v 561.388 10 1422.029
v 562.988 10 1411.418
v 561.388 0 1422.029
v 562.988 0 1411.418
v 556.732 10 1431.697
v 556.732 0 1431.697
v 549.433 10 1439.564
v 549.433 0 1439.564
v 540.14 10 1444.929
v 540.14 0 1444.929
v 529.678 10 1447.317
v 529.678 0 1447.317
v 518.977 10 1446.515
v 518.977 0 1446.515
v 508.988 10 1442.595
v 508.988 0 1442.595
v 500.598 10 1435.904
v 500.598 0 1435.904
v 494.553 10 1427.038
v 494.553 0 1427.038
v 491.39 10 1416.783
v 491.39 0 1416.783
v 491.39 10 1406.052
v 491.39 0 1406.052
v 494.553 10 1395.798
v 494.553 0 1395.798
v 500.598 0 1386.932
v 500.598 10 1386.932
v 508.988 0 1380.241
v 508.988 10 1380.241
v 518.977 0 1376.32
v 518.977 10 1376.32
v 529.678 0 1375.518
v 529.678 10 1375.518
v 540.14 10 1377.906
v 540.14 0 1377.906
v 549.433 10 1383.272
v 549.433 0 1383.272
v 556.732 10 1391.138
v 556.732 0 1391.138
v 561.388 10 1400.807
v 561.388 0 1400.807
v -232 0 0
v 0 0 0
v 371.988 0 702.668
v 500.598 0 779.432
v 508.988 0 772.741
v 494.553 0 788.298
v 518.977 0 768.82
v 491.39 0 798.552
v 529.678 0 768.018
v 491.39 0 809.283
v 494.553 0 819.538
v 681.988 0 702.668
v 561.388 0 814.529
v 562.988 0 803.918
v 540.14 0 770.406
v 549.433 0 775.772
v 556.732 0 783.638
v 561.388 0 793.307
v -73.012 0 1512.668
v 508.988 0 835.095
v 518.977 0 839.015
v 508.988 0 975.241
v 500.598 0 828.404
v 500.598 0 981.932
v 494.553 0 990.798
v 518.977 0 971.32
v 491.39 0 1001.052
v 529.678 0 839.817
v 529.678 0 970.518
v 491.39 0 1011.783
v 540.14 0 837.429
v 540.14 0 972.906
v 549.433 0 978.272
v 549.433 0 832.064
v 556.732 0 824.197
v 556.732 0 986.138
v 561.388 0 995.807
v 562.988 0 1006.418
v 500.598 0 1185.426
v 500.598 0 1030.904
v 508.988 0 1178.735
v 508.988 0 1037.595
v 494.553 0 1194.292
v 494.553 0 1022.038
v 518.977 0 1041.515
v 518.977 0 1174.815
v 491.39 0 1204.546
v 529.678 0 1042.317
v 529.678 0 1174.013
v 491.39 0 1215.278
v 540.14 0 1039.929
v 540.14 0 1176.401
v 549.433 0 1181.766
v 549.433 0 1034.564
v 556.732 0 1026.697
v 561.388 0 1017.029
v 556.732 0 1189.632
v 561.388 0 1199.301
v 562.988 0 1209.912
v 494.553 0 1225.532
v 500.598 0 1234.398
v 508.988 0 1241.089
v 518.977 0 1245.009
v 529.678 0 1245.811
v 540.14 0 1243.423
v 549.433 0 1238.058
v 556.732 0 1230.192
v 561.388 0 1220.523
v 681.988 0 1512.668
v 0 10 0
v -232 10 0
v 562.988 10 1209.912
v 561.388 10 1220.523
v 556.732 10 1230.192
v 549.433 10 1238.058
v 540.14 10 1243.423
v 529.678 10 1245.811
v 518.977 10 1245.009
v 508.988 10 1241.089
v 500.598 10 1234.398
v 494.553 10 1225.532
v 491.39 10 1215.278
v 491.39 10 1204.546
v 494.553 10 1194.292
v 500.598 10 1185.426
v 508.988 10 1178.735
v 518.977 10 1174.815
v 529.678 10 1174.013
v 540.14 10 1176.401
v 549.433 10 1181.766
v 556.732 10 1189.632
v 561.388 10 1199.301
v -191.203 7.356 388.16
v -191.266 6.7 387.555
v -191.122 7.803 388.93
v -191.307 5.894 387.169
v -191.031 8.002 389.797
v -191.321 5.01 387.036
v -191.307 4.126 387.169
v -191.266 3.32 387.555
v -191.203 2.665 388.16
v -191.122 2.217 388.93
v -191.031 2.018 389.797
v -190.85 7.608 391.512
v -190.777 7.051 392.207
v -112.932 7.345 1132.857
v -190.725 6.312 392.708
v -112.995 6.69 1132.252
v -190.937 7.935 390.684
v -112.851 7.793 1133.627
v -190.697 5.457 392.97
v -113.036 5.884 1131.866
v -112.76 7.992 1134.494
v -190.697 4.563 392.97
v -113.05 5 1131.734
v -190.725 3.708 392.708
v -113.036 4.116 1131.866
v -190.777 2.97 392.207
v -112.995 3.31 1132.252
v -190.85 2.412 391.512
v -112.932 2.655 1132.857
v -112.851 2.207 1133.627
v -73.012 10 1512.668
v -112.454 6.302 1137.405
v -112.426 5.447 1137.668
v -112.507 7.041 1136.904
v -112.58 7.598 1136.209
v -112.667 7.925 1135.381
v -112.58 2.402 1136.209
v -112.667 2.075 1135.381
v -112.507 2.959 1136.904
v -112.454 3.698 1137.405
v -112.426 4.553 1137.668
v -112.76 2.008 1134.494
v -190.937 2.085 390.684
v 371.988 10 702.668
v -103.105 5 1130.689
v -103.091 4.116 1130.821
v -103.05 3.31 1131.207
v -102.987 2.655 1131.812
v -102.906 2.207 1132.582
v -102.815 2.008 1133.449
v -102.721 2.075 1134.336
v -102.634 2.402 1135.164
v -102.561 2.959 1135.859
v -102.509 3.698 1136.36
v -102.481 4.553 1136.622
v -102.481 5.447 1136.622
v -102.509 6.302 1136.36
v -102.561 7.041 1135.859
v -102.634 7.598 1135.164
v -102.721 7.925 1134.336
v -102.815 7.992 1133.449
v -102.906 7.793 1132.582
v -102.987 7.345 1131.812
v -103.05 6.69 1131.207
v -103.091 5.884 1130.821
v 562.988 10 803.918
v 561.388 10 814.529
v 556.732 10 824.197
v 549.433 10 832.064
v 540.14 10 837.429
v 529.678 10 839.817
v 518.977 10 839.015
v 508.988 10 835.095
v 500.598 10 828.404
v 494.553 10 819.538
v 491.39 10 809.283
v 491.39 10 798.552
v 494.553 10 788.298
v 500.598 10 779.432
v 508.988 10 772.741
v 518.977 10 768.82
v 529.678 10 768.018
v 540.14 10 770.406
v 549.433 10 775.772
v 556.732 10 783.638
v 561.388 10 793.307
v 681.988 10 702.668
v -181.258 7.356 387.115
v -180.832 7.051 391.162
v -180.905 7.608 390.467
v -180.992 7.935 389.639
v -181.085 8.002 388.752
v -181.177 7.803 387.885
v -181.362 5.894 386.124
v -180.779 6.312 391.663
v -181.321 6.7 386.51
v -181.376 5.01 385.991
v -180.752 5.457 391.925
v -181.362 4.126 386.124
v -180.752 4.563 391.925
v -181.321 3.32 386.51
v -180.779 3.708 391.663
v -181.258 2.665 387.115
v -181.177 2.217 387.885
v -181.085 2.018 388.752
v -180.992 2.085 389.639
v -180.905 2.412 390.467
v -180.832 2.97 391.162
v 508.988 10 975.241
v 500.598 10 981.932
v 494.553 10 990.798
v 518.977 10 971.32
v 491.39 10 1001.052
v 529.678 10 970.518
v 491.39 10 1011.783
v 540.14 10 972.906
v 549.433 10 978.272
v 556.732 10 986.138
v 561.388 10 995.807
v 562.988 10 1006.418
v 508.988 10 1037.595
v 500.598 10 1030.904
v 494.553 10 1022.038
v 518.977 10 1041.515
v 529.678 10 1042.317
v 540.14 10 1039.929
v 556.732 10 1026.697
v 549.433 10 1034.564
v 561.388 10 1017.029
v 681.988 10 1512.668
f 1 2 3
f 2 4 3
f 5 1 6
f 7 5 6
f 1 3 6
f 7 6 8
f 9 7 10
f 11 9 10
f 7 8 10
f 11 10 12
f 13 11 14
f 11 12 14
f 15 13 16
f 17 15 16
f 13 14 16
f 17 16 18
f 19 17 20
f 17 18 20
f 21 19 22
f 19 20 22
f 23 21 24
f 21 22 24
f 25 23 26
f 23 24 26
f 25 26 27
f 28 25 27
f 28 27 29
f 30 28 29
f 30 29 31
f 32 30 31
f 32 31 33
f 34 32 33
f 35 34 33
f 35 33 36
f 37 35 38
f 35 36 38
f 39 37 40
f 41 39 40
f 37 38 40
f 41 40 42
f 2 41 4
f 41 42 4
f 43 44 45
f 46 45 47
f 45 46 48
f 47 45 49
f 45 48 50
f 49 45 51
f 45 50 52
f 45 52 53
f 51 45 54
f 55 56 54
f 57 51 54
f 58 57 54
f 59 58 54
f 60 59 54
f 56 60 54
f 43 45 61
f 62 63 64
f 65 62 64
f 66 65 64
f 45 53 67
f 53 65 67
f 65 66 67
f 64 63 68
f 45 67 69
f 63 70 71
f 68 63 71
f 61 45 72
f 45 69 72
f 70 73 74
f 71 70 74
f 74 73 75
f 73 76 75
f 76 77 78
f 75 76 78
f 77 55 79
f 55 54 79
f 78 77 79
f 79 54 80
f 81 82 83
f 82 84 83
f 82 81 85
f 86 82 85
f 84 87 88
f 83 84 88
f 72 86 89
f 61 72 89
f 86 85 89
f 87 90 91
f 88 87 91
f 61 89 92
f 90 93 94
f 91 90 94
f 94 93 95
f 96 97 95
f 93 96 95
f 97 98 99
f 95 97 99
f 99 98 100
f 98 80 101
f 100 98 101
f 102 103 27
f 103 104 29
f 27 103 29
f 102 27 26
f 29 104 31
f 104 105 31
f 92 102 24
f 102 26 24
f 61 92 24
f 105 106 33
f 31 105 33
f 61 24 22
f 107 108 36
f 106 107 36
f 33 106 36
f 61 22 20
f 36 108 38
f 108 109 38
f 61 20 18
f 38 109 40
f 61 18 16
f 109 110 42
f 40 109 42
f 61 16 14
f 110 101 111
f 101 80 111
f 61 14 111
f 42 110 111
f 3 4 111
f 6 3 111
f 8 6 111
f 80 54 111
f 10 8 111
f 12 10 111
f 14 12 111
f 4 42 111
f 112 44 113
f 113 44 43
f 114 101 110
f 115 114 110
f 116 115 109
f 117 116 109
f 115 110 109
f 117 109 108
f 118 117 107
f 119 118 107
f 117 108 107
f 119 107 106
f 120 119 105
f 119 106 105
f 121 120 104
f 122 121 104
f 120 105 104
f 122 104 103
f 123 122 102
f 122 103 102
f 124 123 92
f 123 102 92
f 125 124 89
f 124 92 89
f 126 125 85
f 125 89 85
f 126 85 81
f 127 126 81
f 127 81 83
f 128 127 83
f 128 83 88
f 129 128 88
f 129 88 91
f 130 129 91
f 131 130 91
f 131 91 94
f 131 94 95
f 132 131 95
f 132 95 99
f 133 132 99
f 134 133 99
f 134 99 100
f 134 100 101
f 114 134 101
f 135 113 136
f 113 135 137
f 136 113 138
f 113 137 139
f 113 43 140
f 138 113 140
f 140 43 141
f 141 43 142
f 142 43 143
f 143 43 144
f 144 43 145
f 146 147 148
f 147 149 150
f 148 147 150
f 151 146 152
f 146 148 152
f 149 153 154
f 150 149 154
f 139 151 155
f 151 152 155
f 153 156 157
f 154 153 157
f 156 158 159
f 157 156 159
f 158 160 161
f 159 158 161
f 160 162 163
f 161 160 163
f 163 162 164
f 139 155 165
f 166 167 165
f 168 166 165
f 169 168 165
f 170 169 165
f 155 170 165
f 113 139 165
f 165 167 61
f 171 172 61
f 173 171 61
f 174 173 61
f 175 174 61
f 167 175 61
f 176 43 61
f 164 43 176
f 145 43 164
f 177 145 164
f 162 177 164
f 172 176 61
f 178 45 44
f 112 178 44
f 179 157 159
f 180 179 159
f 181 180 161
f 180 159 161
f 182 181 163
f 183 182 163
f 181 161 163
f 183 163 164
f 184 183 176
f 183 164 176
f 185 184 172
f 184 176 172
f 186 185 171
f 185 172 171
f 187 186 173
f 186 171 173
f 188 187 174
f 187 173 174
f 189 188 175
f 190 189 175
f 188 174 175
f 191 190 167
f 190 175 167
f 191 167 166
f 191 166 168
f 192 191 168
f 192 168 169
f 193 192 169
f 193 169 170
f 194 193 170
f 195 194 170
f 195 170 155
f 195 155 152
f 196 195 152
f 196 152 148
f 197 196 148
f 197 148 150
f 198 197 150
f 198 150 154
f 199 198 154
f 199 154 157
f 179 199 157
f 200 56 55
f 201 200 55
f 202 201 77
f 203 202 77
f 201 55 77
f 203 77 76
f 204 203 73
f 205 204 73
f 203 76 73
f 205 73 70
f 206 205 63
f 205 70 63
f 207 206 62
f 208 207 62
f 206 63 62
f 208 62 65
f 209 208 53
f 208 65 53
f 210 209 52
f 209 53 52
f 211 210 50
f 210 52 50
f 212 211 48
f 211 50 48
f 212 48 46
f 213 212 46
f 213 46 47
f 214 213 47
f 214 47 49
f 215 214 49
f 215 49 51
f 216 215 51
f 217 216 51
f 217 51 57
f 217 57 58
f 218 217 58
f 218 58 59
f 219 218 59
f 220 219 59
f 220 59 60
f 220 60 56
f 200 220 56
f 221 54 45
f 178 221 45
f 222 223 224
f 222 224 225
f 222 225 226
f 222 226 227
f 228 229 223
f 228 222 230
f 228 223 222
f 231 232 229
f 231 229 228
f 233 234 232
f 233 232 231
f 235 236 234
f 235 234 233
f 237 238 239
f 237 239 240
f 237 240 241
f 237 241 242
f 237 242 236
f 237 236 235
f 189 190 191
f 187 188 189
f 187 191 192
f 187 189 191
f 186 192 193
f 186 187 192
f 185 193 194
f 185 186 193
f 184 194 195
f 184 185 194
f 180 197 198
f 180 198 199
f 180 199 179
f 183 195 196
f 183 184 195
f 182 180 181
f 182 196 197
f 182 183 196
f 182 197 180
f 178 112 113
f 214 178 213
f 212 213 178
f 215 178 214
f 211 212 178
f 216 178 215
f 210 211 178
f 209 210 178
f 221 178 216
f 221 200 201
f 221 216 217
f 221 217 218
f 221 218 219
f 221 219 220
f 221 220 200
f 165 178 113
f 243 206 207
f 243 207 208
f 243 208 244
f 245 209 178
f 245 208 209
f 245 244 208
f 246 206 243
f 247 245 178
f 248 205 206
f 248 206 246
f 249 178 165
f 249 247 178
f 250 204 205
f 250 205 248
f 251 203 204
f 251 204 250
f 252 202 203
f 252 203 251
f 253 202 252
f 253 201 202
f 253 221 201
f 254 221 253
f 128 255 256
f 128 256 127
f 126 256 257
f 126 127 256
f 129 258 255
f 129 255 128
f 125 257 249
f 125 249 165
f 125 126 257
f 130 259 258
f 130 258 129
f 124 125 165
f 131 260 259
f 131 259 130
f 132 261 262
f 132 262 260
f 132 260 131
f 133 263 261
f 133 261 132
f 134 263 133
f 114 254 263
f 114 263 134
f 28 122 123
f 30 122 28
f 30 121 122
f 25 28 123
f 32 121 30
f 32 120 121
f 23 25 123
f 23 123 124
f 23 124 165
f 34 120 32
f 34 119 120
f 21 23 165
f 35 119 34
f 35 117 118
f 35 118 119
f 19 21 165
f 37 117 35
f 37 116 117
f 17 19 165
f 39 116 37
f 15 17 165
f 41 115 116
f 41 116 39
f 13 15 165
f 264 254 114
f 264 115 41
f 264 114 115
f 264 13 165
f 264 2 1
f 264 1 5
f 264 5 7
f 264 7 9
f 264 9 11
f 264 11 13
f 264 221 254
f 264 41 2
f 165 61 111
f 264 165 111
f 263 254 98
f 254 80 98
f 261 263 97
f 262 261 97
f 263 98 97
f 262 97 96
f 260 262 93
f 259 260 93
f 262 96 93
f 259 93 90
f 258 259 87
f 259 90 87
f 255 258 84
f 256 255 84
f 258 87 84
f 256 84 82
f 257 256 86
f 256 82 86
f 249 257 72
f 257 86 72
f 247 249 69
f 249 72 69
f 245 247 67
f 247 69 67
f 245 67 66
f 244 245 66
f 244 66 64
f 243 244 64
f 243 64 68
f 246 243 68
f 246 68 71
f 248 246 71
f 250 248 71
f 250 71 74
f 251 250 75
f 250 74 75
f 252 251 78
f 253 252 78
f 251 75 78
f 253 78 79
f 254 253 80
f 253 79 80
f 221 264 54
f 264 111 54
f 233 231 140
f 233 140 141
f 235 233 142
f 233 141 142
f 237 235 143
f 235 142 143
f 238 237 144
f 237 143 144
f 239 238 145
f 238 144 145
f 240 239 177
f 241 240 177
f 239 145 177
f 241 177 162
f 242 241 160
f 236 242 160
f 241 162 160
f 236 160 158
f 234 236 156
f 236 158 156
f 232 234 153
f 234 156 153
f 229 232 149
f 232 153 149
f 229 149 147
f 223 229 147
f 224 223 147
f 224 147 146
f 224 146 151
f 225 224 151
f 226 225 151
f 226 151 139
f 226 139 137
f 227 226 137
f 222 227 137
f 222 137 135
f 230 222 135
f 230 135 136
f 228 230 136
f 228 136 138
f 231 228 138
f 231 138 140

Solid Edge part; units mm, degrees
sketch "Sketch1" plane through (0, 0, 0) normal (0, -1, 0) x (1, 0, 0)
  line L0 (-73.0122, 1512.6678) -> (681.9878, 1512.6678)
  line L1 (681.9878, 1512.6678) -> (681.9878, 702.6678)
  line L2 (681.9878, 702.6678) -> (371.9878, 702.6678)
  line L3 (371.9878, 702.6678) -> (0, 0)
  line L4 (0, 0) -> (-232, 0)
  line L5 (-232, 0) -> (-73.0122, 1512.6678)
extrude "Protrusion1" add sketch "Sketch1" against normal blind 10
sketch "Sketch2" plane through (224.9939, 0, 756.3339) normal (0, -1, 0) x (1, 0, 0)
  circle A0 centre (301.9939, 655.0839) radius 36
  circle A1 centre (301.9939, 453.5781) radius 36
  circle A2 centre (301.9939, 250.0839) radius 36
  circle A3 centre (301.9939, 47.5839) radius 36
extrude "VaciadoExtruido_1" cut sketch "Sketch2" against normal blind 30.0194
sketch "Sketch3" plane through (-152.5061, 5, 756.3339) normal (-0.9945, 0, 0.1045) x (-0.1045, 0, -0.9945)
  circle A0 centre (-380.4677, 0) radius 3
extrude "VaciadoExtruido_2" cut sketch "Sketch3" against normal blind 10
sketch "Sketch4" plane through (-152.5061, 5, 756.3339) normal (-0.9945, 0, 0.1045) x (-0.1045, 0, -0.9945)
  circle A0 centre (368.3316, -0.0101) radius 3
extrude "VaciadoExtruido_3" cut sketch "Sketch4" against normal blind 10
